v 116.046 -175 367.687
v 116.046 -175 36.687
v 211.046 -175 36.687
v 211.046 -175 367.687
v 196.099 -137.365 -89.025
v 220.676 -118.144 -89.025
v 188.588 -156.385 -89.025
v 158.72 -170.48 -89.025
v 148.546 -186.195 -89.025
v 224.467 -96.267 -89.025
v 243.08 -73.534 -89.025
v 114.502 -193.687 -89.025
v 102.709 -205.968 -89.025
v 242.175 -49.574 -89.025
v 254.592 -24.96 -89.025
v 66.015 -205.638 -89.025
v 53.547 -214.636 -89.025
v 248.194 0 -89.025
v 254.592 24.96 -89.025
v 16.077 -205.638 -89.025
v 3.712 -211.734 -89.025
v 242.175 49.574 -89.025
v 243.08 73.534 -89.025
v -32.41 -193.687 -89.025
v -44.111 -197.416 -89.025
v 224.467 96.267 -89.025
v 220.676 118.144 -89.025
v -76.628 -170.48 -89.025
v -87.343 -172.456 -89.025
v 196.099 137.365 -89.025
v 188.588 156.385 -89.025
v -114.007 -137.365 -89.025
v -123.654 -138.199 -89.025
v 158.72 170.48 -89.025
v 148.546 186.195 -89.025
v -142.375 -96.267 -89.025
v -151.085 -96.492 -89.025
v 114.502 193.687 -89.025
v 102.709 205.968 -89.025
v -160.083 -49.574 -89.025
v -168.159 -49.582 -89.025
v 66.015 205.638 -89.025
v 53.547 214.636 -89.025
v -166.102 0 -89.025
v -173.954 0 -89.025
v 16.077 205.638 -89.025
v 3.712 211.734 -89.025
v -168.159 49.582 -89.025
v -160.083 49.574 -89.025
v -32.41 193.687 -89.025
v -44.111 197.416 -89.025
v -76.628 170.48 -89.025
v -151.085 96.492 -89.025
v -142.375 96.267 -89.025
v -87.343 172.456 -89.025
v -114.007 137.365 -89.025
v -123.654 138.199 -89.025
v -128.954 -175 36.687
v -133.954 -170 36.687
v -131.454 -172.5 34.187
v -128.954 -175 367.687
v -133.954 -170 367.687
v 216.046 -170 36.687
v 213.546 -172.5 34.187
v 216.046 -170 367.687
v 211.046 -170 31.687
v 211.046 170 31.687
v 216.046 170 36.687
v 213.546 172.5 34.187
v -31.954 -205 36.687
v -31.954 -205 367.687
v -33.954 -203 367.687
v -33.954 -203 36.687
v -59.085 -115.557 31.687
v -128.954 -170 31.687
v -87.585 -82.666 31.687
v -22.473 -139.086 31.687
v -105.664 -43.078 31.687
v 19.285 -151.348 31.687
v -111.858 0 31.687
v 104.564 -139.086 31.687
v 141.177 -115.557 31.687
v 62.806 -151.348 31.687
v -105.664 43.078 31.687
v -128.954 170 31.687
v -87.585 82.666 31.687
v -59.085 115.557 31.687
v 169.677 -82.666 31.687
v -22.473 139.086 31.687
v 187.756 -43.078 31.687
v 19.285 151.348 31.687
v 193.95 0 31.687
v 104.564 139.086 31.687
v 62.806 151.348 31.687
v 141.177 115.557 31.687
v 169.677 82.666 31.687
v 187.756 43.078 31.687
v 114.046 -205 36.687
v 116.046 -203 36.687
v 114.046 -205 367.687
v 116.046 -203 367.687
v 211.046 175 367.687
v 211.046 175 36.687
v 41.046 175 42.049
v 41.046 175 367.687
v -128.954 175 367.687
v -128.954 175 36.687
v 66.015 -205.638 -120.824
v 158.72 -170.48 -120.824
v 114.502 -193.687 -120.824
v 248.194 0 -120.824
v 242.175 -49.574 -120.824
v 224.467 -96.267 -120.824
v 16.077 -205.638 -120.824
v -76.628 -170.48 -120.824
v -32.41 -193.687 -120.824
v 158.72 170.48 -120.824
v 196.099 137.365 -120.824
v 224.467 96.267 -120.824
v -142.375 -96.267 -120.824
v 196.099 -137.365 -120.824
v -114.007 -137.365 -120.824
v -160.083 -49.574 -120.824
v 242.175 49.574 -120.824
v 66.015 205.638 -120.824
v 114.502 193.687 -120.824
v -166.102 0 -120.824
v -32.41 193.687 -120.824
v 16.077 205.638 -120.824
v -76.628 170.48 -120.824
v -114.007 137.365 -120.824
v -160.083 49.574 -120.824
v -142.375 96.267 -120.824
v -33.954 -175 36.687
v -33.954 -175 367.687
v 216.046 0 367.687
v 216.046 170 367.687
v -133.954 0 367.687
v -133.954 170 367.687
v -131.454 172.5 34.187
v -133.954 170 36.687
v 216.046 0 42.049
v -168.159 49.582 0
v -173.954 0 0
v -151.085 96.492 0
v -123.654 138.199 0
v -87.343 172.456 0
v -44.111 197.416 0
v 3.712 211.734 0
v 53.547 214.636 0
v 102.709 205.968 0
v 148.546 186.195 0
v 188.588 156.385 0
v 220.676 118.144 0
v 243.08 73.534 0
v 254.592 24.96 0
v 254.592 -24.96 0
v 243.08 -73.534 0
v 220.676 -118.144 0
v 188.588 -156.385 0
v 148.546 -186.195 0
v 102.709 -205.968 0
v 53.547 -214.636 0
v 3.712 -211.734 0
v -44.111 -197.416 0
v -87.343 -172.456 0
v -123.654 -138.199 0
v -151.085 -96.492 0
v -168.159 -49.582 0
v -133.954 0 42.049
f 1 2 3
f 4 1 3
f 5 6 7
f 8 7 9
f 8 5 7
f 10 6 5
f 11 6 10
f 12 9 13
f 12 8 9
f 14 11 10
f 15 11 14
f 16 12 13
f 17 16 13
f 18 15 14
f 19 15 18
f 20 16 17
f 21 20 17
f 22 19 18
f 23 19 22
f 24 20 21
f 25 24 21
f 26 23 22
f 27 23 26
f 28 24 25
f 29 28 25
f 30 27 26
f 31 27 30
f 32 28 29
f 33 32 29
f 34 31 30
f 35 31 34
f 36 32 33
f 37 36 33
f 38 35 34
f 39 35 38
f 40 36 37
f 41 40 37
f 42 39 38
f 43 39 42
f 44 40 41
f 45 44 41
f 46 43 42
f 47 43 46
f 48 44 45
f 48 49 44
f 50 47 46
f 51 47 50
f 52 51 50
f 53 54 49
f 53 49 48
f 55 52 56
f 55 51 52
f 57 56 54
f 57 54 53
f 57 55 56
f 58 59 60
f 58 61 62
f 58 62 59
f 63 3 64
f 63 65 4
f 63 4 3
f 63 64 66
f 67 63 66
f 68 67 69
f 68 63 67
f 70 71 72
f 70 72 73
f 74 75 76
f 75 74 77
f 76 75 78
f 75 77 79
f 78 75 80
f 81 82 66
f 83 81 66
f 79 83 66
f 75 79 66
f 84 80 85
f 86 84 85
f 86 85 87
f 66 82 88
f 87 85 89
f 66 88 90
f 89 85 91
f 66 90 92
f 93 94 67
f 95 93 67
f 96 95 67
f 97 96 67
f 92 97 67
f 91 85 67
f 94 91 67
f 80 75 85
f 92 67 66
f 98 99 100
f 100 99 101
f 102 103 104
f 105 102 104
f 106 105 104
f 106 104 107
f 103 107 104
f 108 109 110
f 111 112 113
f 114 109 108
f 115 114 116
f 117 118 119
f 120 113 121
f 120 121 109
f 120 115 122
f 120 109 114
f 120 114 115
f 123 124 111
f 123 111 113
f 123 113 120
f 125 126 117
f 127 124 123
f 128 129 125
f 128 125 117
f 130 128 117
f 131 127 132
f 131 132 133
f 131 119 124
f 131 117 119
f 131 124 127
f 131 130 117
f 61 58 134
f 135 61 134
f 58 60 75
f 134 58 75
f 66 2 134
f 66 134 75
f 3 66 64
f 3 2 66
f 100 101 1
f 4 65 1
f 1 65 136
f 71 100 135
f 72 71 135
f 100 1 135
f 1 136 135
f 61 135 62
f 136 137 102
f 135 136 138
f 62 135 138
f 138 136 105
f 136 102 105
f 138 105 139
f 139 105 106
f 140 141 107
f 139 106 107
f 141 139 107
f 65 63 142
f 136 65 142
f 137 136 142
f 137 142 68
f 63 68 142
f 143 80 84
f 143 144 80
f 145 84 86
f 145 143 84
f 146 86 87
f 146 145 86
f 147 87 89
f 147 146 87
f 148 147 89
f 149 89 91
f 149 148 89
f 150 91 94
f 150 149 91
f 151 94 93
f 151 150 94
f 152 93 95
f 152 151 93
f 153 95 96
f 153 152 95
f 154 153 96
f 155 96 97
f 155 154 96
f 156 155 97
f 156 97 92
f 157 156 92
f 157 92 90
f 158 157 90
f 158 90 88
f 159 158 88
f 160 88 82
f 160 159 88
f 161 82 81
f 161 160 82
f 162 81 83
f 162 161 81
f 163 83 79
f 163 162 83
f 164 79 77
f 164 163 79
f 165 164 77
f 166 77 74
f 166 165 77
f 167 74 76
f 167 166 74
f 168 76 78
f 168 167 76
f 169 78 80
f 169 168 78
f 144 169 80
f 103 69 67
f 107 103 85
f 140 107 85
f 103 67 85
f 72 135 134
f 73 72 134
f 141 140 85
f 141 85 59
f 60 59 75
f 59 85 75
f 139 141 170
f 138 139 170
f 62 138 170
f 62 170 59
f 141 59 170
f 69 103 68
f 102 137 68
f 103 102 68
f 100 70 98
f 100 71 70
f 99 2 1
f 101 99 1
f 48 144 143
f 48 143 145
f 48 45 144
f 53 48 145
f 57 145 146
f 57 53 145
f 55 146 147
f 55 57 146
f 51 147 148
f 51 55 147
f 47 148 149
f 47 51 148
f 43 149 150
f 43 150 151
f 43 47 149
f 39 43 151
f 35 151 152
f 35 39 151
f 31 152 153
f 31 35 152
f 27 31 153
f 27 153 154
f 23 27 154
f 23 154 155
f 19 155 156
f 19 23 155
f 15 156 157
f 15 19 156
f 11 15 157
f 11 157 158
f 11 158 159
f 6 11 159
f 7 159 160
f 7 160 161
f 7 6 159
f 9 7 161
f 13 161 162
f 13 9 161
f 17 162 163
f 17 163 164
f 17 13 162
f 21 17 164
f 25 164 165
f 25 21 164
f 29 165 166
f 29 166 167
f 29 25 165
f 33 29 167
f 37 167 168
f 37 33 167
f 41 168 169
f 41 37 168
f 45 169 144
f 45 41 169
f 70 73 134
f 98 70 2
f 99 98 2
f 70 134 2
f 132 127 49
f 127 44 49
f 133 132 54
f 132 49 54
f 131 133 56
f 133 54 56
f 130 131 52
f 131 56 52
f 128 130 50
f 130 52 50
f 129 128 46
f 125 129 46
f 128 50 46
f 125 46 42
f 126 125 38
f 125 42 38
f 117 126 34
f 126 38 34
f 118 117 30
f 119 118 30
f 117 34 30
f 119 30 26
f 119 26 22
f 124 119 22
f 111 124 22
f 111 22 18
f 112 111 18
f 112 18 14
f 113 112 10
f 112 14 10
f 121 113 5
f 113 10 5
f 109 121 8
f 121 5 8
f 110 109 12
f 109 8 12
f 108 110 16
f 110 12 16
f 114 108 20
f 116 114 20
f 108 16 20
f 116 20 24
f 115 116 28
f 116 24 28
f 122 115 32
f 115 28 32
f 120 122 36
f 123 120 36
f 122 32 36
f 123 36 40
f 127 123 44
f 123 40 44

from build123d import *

# Parameters (mm, degrees)
F0_W     = 215
F0_H     = 34.0627696488
F0_W_2   = 207.1483027775
F0_H_2   = 31.7993836311
F3_DEPTH = 336
F4_SIZE  = 5
F5_SIZE  = 5
F7_DEPTH = 30
F8_SIZE  = 2


with BuildPart() as f1:
    # F0 (on Front) → F1 (revolve)
    with BuildSketch(Plane.XZ):
        Polygon((-91.5524632784, 42.0493356358), (41.045925168, 42.0493356358), (41.045925168, 171.5008825727), (41.045925168, 367.6874935627), (-133.954074832, 367.6874935627), (-133.954074832, 42.0493356358), align=None)
        Polygon((-173.954074832, 0), (41.045925168, 0), (41.045925168, 42.0493356358), (-91.5524632784, 42.0493356358), align=None)
        with Locations((-66.454074832, -17.0313848244)):
            Rectangle(F0_W, F0_H)
        Polygon((-173.954074832, -89.0246674962), (-166.1023776095, -89.0246674962), (41.045925168, -89.0246674962), (41.045925168, -34.0627696488), (-173.954074832, -34.0627696488), align=None)
        with Locations((-62.5282262207, -104.9243593118)):
            Rectangle(F0_W_2, F0_H_2)
    revolve(axis=Axis((41.045925168, 0, -11.5101449135), (0, 0, -1)))

    # F2 (on face) → F3 (join)
    with BuildSketch(Plane.XY.offset(367.6874935627)):
        with BuildLine():
            Line((41.045925296, 175), (-133.954074832, 175))
            Line((-133.954074832, 175), (-133.954074832, -4.69e-07))
            ThreePointArc((-133.954074832, -4.69e-07), (-82.6977616602, 123.7436865871), (41.045925296, 175))
        make_face()
        with BuildLine():
            ThreePointArc((216.045925168, 0), (164.7896119209, 123.7436866624), (41.045925296, 175))
            ThreePointArc((41.045925296, 175), (-82.6977616602, 123.7436865871), (-133.954074832, -4.69e-07))
            ThreePointArc((-133.954074832, -4.69e-07), (-82.6977616199, -123.7436866274), (41.0459244719, -175))
            ThreePointArc((41.0459244719, -175), (164.7896116296, -123.7436869538), (216.045925168, 0))
        make_face()
        with BuildLine():
            Line((216.045925168, 175), (41.045925296, 175))
            ThreePointArc((41.045925296, 175), (164.7896119209, 123.7436866624), (216.045925168, 0))
            Line((216.045925168, 0), (216.045925168, 175))
        make_face()
        with BuildLine():
            Line((216.045925168, -175), (216.045925168, 0))
            ThreePointArc((216.045925168, 0), (164.7896116296, -123.7436869538), (41.0459244719, -175))
            Line((41.0459244719, -175), (216.045925168, -175))
        make_face()
        with BuildLine():
            ThreePointArc((41.0459244719, -175), (-82.6977616199, -123.7436866274), (-133.954074832, -4.69e-07))
            Line((-133.954074832, -4.69e-07), (-133.954074832, -175))
            Line((-133.954074832, -175), (41.0459244719, -175))
        make_face()
    extrude(amount=-F3_DEPTH)

    # F4
    f4_edges = [f1.edges().sort_by_distance(p)[0] for p in [
        (41.045925, 175, 31.687494),
        (-133.954075, 0, 31.687494),
        (216.045925, 0, 31.687494),
        (41.045925, -175, 31.687494),
    ]]
    chamfer(f4_edges, length=F4_SIZE)

    # F5
    f5_edges = [f1.edges().sort_by_distance(p)[0] for p in [
        (216.045925, 175, 202.187494),
        (216.045925, -175, 202.187494),
        (-133.954075, 175, 202.187494),
        (-133.954075, -175, 202.187494),
    ]]
    chamfer(f5_edges, length=F5_SIZE)

    # F6 (on face) → F7 (join)
    with BuildSketch(Plane.XZ.offset(175)):
        Polygon((-33.954074832, 367.6874935627), (-33.954074832, 36.6874935627), (116.045925168, 36.6874935627), (116.045925168, 367.6874935627), (41.0459247854, 367.6874935627), align=None)
    extrude(amount=F7_DEPTH)

    # F8
    f8_edges = [f1.edges().sort_by_distance(p)[0] for p in [
        (-33.954075, -205, 202.187494),
        (116.045925, -205, 202.187494),
    ]]
    chamfer(f8_edges, length=F8_SIZE)


solid = f1.part
